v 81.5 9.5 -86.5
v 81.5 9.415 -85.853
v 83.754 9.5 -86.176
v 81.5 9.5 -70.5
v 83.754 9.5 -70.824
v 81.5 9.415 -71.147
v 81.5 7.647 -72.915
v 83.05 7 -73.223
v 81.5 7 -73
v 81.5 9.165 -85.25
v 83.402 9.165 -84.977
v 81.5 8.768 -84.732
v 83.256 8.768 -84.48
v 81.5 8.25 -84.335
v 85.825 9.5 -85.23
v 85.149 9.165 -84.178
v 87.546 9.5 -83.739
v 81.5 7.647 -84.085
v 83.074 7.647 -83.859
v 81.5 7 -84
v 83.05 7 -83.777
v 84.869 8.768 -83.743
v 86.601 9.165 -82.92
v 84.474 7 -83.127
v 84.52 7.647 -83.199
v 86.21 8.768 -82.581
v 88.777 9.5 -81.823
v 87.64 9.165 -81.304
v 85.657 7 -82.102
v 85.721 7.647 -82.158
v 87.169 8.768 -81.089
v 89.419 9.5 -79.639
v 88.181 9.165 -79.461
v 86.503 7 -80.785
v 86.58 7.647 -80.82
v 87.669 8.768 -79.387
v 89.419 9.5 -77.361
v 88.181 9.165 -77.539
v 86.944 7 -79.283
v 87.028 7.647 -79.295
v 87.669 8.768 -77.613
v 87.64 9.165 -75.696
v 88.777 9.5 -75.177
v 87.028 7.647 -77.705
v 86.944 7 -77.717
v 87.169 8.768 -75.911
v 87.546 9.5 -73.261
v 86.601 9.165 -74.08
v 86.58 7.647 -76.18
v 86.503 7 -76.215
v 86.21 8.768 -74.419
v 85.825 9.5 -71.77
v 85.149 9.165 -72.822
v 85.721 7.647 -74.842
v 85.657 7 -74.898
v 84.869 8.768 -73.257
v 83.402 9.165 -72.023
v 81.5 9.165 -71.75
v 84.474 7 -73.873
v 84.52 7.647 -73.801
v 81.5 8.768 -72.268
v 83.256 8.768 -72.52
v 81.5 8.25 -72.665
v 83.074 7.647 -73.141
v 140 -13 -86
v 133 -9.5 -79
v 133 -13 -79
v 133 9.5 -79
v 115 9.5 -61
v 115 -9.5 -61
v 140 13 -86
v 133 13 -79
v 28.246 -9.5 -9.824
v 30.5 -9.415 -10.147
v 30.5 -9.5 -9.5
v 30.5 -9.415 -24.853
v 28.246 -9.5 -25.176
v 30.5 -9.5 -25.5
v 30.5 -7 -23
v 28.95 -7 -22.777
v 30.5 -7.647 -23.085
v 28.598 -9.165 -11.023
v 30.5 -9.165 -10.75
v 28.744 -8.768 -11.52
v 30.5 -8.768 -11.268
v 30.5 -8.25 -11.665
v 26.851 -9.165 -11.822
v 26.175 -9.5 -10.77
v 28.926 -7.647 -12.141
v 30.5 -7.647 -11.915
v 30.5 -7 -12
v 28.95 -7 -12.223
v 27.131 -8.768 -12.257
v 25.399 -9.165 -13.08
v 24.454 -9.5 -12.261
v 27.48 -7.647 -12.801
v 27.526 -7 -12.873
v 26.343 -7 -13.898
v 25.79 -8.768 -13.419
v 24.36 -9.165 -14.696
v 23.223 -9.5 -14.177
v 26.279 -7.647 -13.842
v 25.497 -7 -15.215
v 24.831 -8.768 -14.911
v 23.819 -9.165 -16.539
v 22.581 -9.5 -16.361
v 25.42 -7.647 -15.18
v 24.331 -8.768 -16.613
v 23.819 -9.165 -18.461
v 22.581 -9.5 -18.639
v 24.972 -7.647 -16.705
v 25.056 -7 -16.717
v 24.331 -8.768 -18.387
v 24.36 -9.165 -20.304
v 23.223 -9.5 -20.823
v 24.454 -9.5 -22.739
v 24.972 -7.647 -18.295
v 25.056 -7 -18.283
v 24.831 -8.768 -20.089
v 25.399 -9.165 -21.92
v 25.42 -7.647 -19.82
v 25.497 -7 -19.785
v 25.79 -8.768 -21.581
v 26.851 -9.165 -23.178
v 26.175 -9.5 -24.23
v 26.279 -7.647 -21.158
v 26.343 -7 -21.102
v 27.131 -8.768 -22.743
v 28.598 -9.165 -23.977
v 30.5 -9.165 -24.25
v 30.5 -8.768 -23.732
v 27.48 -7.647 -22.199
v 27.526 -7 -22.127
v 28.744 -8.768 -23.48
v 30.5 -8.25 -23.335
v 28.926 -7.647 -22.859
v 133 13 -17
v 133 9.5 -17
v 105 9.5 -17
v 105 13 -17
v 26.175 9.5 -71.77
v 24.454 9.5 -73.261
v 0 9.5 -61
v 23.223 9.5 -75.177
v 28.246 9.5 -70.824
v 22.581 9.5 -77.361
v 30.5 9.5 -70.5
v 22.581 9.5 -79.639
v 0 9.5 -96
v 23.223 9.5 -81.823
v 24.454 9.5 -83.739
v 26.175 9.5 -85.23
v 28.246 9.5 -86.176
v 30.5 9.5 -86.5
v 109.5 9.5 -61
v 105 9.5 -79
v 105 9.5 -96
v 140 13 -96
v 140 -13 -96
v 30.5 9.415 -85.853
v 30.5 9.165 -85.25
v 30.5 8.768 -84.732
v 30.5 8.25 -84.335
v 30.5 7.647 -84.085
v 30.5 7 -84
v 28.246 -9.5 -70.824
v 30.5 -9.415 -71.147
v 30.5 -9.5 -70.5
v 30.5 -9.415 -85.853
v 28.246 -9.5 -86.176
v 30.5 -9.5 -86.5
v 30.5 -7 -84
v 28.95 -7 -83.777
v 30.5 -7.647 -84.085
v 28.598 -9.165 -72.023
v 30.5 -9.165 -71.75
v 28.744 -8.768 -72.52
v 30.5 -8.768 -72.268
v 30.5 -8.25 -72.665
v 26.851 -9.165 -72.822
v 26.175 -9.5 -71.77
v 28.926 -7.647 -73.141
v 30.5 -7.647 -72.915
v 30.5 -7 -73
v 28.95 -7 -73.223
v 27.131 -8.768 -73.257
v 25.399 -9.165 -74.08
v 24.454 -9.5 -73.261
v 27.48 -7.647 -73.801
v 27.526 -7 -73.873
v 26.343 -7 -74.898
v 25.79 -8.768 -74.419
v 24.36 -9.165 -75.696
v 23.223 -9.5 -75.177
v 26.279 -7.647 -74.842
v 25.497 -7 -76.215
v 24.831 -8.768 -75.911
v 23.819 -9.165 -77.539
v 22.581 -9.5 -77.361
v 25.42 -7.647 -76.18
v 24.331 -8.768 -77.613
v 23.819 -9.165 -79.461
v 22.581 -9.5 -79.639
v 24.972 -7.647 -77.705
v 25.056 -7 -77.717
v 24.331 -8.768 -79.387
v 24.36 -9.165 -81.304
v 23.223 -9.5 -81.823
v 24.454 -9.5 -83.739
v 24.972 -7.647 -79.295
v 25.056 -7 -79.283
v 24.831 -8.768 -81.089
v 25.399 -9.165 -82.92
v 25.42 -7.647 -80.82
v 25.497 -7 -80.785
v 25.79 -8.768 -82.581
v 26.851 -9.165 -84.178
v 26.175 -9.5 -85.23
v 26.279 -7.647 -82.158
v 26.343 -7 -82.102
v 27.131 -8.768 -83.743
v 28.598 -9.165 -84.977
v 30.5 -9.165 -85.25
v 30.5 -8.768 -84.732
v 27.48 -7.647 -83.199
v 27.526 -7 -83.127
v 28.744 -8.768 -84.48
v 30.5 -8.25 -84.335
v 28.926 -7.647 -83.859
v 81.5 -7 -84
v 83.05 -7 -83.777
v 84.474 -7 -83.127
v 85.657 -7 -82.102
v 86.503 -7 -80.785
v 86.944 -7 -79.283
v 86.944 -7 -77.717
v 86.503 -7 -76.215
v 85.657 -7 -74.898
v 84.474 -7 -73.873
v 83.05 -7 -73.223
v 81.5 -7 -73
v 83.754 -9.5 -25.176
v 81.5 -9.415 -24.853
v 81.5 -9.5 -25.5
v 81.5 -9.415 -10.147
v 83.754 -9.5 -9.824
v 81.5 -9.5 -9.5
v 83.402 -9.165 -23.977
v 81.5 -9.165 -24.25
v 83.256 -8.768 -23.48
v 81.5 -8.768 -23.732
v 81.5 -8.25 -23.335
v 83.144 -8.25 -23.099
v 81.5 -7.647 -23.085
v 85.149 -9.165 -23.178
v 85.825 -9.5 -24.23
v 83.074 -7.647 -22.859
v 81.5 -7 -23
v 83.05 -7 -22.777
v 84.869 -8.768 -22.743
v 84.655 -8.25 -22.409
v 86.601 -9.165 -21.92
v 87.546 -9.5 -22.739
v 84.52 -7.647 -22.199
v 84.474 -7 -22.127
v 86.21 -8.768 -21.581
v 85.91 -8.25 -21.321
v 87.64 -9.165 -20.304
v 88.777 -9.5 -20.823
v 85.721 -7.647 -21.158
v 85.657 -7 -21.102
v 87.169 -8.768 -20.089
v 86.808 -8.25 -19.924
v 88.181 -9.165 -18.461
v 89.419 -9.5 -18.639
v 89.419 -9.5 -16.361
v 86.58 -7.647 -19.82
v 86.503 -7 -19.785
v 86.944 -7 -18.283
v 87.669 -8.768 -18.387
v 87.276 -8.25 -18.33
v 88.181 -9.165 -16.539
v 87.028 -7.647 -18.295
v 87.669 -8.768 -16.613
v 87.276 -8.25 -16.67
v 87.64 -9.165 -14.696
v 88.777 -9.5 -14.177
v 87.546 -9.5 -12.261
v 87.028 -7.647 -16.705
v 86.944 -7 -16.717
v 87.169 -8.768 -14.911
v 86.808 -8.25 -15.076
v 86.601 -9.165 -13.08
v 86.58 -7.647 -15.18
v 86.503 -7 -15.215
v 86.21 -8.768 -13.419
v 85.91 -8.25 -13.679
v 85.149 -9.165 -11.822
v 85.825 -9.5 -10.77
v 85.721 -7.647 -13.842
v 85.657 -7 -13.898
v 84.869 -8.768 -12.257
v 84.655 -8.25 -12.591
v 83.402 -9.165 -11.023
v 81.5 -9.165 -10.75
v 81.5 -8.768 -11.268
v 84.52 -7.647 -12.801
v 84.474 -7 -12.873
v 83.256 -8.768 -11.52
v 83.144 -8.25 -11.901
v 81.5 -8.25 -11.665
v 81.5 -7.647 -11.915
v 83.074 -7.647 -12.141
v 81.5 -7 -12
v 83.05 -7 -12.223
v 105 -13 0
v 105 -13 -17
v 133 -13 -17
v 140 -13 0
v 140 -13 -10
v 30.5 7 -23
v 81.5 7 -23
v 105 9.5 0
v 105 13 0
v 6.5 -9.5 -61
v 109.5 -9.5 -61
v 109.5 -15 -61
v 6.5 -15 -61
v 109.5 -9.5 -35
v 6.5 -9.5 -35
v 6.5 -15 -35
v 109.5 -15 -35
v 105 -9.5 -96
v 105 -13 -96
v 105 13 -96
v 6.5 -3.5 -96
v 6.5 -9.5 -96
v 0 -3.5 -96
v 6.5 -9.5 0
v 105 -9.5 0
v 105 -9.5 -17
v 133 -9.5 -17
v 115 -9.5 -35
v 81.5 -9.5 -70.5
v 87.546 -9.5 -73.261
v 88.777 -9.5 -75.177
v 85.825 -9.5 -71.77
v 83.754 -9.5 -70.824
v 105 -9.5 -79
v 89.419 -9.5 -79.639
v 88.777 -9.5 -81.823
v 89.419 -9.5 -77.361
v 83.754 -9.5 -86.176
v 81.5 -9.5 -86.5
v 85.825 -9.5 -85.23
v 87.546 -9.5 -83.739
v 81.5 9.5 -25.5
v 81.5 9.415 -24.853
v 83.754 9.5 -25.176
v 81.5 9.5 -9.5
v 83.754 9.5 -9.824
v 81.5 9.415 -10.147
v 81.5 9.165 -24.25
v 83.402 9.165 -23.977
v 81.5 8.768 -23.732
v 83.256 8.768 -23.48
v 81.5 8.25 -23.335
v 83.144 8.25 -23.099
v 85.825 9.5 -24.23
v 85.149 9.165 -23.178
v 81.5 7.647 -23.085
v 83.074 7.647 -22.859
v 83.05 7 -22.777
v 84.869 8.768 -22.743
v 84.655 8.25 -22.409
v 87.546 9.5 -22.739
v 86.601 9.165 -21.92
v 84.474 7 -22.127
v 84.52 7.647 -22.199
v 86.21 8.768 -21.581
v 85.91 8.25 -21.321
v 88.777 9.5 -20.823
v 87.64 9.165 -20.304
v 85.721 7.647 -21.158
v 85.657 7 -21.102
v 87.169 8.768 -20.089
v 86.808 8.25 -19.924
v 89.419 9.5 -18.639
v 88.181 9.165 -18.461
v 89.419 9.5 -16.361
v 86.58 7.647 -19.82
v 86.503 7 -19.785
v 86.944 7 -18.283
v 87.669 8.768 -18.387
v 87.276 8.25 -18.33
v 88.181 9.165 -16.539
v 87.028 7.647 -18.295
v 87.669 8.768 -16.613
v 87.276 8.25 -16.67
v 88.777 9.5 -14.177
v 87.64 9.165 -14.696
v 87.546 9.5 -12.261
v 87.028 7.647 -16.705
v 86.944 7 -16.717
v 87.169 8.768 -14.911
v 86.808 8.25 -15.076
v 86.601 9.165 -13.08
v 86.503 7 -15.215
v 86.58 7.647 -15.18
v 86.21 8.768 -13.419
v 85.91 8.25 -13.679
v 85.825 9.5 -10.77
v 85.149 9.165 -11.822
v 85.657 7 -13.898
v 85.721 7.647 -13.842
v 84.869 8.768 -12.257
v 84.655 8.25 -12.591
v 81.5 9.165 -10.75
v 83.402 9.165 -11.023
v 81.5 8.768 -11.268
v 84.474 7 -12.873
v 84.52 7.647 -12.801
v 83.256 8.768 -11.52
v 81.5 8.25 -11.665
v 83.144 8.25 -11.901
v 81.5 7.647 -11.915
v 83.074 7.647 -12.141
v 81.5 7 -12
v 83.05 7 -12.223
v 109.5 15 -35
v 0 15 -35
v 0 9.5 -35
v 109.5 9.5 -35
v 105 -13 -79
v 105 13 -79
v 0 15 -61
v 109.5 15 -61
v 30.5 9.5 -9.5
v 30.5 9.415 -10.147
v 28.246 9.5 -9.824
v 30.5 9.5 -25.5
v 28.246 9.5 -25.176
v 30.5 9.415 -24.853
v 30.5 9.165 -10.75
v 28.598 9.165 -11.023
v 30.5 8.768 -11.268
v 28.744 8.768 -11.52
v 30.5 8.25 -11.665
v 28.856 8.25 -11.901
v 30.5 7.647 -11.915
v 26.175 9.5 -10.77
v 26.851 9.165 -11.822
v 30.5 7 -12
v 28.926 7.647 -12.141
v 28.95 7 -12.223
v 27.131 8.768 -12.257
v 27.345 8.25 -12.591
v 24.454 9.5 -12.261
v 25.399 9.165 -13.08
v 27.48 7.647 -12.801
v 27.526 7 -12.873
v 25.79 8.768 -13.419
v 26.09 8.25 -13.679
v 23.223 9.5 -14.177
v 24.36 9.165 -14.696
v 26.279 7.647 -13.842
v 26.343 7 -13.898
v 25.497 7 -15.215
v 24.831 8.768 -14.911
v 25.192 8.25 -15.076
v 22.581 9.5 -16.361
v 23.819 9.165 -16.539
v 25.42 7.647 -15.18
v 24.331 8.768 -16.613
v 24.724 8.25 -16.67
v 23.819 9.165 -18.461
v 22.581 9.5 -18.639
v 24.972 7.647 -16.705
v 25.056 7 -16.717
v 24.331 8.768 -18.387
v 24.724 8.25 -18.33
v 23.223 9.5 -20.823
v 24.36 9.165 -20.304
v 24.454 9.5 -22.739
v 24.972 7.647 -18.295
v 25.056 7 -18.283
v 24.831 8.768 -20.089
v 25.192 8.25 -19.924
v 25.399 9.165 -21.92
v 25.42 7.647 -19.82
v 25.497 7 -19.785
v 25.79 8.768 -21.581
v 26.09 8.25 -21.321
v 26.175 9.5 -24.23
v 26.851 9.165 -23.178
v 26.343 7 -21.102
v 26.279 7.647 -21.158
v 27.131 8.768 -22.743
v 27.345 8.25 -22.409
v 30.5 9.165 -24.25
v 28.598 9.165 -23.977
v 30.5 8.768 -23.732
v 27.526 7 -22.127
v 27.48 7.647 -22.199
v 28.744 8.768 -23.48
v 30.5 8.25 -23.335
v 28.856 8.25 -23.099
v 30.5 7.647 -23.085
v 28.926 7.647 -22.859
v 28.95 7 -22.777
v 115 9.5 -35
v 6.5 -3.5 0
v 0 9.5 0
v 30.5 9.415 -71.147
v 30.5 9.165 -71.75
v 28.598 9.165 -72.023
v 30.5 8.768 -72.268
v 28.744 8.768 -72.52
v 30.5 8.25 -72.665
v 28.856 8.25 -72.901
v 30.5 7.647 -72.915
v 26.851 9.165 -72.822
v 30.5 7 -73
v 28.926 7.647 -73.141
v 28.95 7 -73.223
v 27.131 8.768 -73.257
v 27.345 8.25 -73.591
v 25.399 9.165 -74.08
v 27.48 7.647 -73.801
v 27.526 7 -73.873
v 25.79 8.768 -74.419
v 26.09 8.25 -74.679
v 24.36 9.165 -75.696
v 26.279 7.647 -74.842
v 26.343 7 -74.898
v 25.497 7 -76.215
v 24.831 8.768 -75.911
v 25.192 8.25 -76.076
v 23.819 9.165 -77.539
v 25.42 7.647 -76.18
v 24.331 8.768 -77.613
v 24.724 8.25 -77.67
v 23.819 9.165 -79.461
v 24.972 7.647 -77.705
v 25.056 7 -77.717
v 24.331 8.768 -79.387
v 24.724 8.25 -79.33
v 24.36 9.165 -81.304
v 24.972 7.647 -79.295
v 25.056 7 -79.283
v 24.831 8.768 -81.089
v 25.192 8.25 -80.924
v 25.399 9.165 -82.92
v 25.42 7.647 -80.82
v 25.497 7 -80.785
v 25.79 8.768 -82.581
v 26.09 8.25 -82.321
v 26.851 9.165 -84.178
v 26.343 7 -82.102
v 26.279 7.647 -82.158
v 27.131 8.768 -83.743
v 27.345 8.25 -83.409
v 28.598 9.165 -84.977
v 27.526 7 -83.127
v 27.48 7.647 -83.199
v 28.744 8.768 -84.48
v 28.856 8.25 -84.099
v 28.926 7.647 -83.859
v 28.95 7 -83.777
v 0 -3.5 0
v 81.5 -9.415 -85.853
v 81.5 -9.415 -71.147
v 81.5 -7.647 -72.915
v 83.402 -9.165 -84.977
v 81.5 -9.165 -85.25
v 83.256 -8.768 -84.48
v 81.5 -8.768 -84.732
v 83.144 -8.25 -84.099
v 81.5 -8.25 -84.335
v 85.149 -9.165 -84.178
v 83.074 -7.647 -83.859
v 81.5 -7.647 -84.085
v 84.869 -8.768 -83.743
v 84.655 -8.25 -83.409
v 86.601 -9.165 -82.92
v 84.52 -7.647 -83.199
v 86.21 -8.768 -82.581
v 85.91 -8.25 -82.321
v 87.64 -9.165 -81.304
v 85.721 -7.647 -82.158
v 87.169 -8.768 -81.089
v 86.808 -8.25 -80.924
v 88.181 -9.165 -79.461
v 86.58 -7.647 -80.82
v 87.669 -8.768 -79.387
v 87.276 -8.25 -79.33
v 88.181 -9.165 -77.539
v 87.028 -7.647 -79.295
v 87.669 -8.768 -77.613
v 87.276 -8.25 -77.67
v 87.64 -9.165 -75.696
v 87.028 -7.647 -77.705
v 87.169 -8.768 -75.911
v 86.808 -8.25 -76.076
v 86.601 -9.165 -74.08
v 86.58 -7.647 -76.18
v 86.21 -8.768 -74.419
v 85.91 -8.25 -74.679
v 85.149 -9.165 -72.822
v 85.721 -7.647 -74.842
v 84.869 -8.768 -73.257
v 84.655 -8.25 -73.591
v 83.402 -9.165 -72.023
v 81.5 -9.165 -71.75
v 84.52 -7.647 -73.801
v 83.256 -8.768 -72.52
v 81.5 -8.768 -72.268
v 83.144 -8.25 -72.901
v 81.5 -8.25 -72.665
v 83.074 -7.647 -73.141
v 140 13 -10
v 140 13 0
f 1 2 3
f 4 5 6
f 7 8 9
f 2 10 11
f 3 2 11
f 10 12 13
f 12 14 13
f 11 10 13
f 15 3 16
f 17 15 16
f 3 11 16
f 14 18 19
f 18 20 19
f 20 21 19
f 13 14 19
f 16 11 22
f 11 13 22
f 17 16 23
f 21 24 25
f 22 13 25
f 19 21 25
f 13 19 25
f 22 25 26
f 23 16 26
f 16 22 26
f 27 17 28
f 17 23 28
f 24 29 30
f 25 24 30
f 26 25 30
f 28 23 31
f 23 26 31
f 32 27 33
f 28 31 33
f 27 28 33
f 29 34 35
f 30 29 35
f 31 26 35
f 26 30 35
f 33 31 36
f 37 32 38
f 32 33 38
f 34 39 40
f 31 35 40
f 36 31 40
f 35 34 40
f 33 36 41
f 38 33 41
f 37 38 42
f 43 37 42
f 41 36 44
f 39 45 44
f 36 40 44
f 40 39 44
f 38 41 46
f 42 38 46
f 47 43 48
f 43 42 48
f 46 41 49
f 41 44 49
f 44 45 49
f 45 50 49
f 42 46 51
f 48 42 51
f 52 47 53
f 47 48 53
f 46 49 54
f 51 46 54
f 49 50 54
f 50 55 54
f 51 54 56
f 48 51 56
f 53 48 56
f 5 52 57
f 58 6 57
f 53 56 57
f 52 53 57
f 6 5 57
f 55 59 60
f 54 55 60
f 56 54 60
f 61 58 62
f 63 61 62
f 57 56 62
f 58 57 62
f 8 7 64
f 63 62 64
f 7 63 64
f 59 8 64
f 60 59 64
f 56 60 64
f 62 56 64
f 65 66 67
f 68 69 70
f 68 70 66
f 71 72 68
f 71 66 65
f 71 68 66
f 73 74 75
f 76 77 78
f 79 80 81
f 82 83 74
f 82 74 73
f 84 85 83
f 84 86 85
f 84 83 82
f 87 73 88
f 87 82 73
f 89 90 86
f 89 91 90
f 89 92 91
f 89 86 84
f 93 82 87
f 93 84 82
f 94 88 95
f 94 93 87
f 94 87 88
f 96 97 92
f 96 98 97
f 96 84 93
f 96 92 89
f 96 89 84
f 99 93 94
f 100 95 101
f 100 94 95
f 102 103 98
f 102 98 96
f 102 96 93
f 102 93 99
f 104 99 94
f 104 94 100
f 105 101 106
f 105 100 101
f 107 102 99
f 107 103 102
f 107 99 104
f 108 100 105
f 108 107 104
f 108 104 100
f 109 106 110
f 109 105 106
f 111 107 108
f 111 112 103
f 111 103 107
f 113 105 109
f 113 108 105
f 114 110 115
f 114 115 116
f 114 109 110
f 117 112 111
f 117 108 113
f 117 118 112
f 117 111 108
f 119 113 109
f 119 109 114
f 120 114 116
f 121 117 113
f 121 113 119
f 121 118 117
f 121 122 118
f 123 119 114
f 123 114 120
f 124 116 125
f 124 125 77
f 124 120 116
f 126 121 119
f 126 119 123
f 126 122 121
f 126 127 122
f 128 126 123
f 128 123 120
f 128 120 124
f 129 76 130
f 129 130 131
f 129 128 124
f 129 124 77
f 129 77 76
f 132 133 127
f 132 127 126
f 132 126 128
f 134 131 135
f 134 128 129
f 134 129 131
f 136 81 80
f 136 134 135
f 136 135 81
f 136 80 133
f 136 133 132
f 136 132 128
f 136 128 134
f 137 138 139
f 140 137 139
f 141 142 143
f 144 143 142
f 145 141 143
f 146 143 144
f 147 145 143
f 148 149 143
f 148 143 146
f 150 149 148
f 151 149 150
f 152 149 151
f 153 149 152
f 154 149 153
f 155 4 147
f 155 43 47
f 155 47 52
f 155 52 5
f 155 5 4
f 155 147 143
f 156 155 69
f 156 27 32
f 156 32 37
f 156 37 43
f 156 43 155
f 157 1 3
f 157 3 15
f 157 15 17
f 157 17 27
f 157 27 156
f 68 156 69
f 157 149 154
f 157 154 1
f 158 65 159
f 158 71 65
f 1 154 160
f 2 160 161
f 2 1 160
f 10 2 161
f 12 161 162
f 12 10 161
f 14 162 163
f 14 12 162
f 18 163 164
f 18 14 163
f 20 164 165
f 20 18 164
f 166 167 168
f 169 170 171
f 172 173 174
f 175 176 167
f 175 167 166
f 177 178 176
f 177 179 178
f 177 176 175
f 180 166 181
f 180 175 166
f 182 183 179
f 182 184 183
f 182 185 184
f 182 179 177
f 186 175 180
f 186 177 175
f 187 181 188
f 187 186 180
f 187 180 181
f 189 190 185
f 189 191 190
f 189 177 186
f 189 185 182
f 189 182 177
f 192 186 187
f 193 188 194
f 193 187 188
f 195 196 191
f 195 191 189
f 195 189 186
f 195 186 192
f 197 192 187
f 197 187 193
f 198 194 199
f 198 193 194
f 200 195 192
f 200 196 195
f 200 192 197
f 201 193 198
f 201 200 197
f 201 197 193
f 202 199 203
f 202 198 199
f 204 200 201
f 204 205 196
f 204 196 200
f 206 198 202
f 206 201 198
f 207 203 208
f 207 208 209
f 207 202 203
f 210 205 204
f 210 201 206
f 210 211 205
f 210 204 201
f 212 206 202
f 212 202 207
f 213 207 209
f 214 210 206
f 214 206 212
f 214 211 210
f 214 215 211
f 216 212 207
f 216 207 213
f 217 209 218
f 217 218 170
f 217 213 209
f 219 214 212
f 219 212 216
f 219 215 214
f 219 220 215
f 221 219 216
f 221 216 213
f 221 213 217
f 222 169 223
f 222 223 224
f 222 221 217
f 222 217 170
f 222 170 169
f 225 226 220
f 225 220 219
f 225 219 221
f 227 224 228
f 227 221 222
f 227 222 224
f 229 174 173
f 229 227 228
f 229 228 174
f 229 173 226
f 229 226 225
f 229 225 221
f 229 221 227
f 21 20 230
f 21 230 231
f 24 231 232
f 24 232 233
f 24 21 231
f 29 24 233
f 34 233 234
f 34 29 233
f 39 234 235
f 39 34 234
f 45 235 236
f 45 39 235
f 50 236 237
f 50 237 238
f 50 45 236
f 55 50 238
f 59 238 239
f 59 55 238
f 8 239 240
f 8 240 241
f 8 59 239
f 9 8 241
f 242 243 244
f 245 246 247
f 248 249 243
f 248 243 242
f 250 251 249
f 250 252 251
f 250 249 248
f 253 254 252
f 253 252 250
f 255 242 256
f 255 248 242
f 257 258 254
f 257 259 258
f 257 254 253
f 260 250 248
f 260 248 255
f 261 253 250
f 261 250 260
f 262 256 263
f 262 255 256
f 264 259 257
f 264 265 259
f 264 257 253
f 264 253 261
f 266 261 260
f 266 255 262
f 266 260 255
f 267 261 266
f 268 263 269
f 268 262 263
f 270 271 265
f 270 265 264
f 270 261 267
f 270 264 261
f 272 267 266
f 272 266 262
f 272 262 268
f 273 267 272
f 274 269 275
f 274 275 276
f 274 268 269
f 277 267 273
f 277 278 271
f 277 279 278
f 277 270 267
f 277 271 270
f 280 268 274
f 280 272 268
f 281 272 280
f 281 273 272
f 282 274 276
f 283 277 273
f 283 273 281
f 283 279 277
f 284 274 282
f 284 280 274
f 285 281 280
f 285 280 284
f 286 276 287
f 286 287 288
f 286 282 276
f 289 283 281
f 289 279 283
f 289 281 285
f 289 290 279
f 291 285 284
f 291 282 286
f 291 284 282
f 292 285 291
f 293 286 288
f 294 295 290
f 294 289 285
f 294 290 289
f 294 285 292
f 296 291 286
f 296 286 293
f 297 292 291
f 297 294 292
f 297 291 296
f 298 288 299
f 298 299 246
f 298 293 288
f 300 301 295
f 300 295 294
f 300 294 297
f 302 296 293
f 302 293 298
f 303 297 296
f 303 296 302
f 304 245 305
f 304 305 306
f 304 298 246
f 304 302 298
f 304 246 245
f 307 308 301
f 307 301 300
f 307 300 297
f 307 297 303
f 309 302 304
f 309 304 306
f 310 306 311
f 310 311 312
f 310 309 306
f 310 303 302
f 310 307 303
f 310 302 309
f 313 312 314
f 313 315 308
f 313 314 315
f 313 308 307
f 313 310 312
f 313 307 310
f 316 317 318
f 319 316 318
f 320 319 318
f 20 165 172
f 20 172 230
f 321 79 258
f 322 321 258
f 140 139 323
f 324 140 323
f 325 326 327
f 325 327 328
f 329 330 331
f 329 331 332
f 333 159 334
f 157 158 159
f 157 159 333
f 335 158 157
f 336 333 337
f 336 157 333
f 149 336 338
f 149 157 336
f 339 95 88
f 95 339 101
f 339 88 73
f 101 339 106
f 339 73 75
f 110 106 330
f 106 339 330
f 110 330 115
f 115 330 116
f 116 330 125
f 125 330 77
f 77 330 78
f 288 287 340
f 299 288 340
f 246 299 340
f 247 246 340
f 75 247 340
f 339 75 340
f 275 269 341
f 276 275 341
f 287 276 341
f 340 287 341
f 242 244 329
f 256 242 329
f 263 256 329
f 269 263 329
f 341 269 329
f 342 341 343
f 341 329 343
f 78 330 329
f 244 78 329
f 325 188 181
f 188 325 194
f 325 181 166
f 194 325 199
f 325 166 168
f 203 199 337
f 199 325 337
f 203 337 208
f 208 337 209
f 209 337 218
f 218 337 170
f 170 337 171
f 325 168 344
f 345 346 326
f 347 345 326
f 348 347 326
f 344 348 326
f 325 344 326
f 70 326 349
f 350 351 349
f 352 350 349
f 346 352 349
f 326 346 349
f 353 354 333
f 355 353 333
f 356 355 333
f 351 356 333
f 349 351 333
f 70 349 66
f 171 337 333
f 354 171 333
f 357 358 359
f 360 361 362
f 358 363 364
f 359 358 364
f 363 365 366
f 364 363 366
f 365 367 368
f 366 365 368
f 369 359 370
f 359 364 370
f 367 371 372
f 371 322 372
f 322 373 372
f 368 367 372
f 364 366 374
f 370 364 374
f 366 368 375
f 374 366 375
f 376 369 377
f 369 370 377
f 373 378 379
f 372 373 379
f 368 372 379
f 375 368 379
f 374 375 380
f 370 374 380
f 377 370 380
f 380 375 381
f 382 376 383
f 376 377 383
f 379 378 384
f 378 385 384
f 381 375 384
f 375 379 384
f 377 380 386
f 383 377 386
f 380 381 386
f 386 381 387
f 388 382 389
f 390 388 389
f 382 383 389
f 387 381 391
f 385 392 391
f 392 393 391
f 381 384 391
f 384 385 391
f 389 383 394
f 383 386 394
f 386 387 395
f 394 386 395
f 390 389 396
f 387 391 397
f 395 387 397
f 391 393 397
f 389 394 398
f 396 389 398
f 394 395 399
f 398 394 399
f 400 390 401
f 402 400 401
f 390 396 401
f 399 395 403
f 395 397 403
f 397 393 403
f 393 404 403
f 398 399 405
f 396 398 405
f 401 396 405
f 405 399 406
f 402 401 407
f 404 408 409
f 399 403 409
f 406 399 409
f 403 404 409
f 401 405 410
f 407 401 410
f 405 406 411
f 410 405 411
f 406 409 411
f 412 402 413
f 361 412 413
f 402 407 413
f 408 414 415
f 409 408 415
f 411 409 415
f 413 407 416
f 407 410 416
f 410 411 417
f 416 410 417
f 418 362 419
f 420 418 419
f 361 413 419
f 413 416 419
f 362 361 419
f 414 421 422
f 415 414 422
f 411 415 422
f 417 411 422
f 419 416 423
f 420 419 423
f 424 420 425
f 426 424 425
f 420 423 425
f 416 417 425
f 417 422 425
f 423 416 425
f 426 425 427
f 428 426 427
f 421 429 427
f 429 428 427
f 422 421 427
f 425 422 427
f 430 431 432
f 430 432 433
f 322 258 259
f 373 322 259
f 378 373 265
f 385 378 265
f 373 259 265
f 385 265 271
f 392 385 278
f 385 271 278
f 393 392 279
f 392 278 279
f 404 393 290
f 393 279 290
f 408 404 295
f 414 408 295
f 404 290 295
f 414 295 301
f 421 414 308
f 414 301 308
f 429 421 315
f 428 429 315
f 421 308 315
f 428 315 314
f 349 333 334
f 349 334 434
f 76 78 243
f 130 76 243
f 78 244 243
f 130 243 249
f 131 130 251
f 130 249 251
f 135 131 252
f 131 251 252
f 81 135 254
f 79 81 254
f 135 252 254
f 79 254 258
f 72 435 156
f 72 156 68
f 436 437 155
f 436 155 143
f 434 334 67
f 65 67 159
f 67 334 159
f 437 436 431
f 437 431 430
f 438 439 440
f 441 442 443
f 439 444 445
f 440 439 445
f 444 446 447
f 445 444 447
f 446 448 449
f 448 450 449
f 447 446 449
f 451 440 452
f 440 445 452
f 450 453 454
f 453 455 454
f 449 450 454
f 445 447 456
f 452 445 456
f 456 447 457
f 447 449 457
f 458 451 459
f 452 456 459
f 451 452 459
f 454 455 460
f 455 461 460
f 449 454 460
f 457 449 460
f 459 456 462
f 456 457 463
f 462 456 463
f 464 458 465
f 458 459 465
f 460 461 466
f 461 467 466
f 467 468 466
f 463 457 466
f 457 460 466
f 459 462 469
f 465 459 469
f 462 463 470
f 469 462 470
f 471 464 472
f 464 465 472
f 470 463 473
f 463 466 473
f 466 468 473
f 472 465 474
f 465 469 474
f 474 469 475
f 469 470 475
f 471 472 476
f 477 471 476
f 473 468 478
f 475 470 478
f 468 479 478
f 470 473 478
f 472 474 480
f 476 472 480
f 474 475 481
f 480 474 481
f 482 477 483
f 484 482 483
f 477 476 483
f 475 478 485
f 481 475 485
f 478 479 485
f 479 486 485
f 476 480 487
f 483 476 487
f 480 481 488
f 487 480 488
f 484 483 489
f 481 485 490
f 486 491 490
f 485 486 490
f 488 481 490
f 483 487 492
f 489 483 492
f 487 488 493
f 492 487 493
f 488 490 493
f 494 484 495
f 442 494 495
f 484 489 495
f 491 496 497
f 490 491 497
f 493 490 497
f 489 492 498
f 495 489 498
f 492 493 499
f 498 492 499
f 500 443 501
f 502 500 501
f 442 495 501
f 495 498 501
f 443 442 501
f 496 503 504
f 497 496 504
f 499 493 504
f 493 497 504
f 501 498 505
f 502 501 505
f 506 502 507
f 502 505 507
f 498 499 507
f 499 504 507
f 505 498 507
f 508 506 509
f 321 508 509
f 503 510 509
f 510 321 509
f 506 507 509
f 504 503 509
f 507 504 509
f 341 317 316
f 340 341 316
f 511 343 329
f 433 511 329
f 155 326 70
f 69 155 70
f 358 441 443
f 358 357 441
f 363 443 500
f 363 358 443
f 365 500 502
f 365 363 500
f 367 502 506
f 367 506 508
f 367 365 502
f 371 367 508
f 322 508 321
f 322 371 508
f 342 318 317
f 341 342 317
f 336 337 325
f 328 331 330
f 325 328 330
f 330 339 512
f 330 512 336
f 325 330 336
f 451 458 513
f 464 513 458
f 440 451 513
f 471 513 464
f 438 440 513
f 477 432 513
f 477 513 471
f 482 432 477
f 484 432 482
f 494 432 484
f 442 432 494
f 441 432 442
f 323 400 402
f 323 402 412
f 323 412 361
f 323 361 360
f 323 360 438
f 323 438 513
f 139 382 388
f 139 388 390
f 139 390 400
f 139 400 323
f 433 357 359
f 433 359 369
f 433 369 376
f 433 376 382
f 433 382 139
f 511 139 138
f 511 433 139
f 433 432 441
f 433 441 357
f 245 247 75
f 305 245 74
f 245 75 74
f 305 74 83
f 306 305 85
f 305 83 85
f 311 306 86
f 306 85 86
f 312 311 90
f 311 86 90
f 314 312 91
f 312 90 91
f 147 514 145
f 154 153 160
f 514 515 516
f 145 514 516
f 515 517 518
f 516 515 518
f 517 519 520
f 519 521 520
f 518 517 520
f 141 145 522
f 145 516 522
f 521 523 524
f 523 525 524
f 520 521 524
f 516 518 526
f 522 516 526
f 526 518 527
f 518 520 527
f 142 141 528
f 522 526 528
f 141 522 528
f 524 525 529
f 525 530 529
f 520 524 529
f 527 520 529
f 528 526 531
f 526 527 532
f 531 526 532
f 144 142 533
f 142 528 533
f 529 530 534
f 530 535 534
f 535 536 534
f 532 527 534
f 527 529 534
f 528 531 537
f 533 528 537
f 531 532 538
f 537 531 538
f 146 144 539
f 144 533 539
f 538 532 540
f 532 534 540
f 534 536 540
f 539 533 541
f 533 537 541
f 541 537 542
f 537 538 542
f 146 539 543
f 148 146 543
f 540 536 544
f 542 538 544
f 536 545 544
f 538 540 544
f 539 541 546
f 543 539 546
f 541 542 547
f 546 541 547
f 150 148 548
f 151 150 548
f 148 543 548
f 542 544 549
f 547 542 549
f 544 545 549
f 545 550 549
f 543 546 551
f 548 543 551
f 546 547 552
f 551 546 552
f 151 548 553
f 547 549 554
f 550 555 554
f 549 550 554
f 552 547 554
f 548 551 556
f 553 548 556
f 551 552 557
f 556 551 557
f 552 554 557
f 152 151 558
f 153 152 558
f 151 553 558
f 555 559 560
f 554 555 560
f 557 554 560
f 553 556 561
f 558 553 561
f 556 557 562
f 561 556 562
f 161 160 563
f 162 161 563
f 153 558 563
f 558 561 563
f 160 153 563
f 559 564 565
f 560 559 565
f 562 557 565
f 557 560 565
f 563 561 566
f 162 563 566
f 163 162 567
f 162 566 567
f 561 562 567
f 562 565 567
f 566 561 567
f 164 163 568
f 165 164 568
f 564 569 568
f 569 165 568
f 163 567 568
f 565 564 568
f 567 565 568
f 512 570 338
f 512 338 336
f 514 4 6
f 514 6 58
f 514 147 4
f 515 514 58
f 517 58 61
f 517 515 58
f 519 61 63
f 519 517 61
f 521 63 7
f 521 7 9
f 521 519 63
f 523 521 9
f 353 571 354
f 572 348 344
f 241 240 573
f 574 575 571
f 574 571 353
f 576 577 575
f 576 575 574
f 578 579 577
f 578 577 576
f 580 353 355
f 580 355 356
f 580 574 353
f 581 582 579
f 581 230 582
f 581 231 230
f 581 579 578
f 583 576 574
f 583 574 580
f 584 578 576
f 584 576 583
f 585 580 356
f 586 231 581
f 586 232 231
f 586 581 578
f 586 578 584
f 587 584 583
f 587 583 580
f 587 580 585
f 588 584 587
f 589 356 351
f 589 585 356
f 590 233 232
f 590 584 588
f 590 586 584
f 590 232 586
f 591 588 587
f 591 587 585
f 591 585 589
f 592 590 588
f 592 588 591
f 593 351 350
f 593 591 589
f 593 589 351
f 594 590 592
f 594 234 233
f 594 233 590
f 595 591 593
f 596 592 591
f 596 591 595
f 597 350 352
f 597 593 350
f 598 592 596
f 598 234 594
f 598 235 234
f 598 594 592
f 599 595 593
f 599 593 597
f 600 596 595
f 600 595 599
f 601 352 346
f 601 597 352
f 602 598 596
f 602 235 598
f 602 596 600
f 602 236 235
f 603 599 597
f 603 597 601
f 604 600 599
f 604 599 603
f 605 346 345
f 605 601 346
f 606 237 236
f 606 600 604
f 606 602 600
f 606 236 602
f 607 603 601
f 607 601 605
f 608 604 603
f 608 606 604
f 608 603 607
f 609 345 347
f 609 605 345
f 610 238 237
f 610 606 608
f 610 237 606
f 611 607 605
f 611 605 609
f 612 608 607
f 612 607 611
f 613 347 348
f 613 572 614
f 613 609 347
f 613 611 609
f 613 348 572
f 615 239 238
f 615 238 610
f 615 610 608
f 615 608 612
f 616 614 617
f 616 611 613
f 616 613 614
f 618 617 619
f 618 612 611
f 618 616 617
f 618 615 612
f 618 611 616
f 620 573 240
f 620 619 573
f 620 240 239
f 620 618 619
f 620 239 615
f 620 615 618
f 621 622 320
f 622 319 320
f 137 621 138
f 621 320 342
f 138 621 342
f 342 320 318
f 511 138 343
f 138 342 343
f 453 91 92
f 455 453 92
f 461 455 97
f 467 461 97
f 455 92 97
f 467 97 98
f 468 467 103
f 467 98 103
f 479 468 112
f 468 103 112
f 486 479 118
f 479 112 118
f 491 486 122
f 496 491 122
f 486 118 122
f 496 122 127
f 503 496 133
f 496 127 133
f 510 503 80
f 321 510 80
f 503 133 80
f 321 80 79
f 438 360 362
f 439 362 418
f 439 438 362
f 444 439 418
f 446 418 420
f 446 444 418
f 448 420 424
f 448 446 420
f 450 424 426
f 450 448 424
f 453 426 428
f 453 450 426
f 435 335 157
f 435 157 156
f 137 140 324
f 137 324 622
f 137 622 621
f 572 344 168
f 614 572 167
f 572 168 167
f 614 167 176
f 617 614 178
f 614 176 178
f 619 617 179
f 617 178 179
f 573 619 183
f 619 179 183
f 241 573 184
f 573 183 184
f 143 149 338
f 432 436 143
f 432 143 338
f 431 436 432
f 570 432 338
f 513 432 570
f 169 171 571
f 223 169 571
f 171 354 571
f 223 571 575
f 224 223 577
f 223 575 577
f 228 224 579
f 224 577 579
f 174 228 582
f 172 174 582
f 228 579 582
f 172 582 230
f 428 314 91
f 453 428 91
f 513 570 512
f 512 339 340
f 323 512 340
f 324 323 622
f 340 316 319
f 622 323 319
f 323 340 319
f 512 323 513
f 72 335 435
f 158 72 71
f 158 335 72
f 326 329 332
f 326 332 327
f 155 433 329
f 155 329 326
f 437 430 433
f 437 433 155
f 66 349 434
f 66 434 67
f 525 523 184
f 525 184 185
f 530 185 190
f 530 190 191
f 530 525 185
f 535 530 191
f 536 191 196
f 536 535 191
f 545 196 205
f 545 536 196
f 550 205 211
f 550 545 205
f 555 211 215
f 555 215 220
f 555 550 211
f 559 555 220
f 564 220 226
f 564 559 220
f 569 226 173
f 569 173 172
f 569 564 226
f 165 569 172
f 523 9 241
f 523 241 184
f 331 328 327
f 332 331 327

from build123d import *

# Parameters (mm, degrees)
BOSS_EXTRUDE3_DEPTH = 15
BOSS_EXTRUDE4_DEPTH = 9.5
BOSS_EXTRUDE5_DEPTH = 13
FILLET2_R           = 2.5
FILLET3_R           = 2.5
SKETCH2_W           = 6.5
SKETCH2_H           = 11.5
CUT_EXTRUDE1_DEPTH  = 171.414201286


with BuildPart() as part:
    # Sketch1 → Boss-Extrude3 (new, symmetric)
    with BuildSketch(Plane(origin=(0, 0, 0), x_dir=(1, 0, 0), z_dir=(0, 1, 0))):
        Polygon((0, 61), (0, 35), (109.5, 35), (109.5, 48), (109.5, 61), align=None)
    extrude(amount=BOSS_EXTRUDE3_DEPTH, both=True)

    # Sketch1<7> → Boss-Extrude4 (add, symmetric)
    # profile 1 of 2: a face of its own
    with BuildSketch(Plane(origin=(0, 0, 0), x_dir=(1, 0, 0), z_dir=(0, 1, 0))):
        Polygon((0, 35), (0, 0), (105, 0), (105, 17), (133, 17), (115, 35), align=None)
        with BuildLine():
            ThreePointArc((30.5, 12), (25, 17.5), (30.5, 23))
            Line((30.5, 23), (81.5, 23))
            ThreePointArc((81.5, 23), (87, 17.5), (81.5, 12))
            Line((81.5, 12), (30.5, 12))
        make_face(mode=Mode.SUBTRACT)
    # profile 2 of 2: a face of its own
    with BuildSketch(Plane(origin=(0, 0, 0), x_dir=(1, 0, 0), z_dir=(0, 1, 0))):
        Polygon((0, 96), (0, 61), (115, 61), (133, 79), (105, 79), (105, 96), align=None)
        with BuildLine():
            Line((81.5, 73), (30.5, 73))
            ThreePointArc((30.5, 73), (25, 78.5), (30.5, 84))
            Line((30.5, 84), (81.5, 84))
            ThreePointArc((81.5, 84), (87, 78.5), (81.5, 73))
        make_face(mode=Mode.SUBTRACT)
    extrude(amount=BOSS_EXTRUDE4_DEPTH, both=True)

    # Sketch1<8> → Boss-Extrude5 (add, symmetric)
    with BuildSketch(Plane(origin=(0, 0, 0), x_dir=(1, 0, 0), z_dir=(0, 1, 0))):
        Polygon((105, 17), (105, 0), (140, 0), (140, 10), (133, 17), align=None)
        Polygon((140, 96), (105, 96), (105, 79), (133, 79), (140, 86), align=None)
    extrude(amount=BOSS_EXTRUDE5_DEPTH, both=True)

    # Fillet2
    fillet2_edges = [part.edges().sort_by_distance(p)[0] for p in [
        (56, 9.5, -12),
        (56, -9.5, -12),
        (56, 9.5, -23),
        (56, -9.5, -23),
        (25, 9.5, -17.5),
        (25, -9.5, -17.5),
        (87, 9.5, -17.5),
        (87, -9.5, -17.5),
    ]]
    fillet(fillet2_edges, radius=FILLET2_R)

    # Fillet3
    fillet3_edges = [part.edges().sort_by_distance(p)[0] for p in [
        (56, 9.5, -84),
        (56, -9.5, -84),
        (56, 9.5, -73),
        (56, -9.5, -73),
        (87, 9.5, -78.5),
        (87, -9.5, -78.5),
        (25, 9.5, -78.5),
        (25, -9.5, -78.5),
    ]]
    fillet(fillet3_edges, radius=FILLET3_R)

    # Sketch2 → Cut-Extrude1 (cut, through all)
    with BuildSketch(Plane.XY):
        with Locations((3.25, -9.25)):
            Rectangle(SKETCH2_W, SKETCH2_H)
    extrude(amount=-CUT_EXTRUDE1_DEPTH, mode=Mode.SUBTRACT)


solid = part.part
